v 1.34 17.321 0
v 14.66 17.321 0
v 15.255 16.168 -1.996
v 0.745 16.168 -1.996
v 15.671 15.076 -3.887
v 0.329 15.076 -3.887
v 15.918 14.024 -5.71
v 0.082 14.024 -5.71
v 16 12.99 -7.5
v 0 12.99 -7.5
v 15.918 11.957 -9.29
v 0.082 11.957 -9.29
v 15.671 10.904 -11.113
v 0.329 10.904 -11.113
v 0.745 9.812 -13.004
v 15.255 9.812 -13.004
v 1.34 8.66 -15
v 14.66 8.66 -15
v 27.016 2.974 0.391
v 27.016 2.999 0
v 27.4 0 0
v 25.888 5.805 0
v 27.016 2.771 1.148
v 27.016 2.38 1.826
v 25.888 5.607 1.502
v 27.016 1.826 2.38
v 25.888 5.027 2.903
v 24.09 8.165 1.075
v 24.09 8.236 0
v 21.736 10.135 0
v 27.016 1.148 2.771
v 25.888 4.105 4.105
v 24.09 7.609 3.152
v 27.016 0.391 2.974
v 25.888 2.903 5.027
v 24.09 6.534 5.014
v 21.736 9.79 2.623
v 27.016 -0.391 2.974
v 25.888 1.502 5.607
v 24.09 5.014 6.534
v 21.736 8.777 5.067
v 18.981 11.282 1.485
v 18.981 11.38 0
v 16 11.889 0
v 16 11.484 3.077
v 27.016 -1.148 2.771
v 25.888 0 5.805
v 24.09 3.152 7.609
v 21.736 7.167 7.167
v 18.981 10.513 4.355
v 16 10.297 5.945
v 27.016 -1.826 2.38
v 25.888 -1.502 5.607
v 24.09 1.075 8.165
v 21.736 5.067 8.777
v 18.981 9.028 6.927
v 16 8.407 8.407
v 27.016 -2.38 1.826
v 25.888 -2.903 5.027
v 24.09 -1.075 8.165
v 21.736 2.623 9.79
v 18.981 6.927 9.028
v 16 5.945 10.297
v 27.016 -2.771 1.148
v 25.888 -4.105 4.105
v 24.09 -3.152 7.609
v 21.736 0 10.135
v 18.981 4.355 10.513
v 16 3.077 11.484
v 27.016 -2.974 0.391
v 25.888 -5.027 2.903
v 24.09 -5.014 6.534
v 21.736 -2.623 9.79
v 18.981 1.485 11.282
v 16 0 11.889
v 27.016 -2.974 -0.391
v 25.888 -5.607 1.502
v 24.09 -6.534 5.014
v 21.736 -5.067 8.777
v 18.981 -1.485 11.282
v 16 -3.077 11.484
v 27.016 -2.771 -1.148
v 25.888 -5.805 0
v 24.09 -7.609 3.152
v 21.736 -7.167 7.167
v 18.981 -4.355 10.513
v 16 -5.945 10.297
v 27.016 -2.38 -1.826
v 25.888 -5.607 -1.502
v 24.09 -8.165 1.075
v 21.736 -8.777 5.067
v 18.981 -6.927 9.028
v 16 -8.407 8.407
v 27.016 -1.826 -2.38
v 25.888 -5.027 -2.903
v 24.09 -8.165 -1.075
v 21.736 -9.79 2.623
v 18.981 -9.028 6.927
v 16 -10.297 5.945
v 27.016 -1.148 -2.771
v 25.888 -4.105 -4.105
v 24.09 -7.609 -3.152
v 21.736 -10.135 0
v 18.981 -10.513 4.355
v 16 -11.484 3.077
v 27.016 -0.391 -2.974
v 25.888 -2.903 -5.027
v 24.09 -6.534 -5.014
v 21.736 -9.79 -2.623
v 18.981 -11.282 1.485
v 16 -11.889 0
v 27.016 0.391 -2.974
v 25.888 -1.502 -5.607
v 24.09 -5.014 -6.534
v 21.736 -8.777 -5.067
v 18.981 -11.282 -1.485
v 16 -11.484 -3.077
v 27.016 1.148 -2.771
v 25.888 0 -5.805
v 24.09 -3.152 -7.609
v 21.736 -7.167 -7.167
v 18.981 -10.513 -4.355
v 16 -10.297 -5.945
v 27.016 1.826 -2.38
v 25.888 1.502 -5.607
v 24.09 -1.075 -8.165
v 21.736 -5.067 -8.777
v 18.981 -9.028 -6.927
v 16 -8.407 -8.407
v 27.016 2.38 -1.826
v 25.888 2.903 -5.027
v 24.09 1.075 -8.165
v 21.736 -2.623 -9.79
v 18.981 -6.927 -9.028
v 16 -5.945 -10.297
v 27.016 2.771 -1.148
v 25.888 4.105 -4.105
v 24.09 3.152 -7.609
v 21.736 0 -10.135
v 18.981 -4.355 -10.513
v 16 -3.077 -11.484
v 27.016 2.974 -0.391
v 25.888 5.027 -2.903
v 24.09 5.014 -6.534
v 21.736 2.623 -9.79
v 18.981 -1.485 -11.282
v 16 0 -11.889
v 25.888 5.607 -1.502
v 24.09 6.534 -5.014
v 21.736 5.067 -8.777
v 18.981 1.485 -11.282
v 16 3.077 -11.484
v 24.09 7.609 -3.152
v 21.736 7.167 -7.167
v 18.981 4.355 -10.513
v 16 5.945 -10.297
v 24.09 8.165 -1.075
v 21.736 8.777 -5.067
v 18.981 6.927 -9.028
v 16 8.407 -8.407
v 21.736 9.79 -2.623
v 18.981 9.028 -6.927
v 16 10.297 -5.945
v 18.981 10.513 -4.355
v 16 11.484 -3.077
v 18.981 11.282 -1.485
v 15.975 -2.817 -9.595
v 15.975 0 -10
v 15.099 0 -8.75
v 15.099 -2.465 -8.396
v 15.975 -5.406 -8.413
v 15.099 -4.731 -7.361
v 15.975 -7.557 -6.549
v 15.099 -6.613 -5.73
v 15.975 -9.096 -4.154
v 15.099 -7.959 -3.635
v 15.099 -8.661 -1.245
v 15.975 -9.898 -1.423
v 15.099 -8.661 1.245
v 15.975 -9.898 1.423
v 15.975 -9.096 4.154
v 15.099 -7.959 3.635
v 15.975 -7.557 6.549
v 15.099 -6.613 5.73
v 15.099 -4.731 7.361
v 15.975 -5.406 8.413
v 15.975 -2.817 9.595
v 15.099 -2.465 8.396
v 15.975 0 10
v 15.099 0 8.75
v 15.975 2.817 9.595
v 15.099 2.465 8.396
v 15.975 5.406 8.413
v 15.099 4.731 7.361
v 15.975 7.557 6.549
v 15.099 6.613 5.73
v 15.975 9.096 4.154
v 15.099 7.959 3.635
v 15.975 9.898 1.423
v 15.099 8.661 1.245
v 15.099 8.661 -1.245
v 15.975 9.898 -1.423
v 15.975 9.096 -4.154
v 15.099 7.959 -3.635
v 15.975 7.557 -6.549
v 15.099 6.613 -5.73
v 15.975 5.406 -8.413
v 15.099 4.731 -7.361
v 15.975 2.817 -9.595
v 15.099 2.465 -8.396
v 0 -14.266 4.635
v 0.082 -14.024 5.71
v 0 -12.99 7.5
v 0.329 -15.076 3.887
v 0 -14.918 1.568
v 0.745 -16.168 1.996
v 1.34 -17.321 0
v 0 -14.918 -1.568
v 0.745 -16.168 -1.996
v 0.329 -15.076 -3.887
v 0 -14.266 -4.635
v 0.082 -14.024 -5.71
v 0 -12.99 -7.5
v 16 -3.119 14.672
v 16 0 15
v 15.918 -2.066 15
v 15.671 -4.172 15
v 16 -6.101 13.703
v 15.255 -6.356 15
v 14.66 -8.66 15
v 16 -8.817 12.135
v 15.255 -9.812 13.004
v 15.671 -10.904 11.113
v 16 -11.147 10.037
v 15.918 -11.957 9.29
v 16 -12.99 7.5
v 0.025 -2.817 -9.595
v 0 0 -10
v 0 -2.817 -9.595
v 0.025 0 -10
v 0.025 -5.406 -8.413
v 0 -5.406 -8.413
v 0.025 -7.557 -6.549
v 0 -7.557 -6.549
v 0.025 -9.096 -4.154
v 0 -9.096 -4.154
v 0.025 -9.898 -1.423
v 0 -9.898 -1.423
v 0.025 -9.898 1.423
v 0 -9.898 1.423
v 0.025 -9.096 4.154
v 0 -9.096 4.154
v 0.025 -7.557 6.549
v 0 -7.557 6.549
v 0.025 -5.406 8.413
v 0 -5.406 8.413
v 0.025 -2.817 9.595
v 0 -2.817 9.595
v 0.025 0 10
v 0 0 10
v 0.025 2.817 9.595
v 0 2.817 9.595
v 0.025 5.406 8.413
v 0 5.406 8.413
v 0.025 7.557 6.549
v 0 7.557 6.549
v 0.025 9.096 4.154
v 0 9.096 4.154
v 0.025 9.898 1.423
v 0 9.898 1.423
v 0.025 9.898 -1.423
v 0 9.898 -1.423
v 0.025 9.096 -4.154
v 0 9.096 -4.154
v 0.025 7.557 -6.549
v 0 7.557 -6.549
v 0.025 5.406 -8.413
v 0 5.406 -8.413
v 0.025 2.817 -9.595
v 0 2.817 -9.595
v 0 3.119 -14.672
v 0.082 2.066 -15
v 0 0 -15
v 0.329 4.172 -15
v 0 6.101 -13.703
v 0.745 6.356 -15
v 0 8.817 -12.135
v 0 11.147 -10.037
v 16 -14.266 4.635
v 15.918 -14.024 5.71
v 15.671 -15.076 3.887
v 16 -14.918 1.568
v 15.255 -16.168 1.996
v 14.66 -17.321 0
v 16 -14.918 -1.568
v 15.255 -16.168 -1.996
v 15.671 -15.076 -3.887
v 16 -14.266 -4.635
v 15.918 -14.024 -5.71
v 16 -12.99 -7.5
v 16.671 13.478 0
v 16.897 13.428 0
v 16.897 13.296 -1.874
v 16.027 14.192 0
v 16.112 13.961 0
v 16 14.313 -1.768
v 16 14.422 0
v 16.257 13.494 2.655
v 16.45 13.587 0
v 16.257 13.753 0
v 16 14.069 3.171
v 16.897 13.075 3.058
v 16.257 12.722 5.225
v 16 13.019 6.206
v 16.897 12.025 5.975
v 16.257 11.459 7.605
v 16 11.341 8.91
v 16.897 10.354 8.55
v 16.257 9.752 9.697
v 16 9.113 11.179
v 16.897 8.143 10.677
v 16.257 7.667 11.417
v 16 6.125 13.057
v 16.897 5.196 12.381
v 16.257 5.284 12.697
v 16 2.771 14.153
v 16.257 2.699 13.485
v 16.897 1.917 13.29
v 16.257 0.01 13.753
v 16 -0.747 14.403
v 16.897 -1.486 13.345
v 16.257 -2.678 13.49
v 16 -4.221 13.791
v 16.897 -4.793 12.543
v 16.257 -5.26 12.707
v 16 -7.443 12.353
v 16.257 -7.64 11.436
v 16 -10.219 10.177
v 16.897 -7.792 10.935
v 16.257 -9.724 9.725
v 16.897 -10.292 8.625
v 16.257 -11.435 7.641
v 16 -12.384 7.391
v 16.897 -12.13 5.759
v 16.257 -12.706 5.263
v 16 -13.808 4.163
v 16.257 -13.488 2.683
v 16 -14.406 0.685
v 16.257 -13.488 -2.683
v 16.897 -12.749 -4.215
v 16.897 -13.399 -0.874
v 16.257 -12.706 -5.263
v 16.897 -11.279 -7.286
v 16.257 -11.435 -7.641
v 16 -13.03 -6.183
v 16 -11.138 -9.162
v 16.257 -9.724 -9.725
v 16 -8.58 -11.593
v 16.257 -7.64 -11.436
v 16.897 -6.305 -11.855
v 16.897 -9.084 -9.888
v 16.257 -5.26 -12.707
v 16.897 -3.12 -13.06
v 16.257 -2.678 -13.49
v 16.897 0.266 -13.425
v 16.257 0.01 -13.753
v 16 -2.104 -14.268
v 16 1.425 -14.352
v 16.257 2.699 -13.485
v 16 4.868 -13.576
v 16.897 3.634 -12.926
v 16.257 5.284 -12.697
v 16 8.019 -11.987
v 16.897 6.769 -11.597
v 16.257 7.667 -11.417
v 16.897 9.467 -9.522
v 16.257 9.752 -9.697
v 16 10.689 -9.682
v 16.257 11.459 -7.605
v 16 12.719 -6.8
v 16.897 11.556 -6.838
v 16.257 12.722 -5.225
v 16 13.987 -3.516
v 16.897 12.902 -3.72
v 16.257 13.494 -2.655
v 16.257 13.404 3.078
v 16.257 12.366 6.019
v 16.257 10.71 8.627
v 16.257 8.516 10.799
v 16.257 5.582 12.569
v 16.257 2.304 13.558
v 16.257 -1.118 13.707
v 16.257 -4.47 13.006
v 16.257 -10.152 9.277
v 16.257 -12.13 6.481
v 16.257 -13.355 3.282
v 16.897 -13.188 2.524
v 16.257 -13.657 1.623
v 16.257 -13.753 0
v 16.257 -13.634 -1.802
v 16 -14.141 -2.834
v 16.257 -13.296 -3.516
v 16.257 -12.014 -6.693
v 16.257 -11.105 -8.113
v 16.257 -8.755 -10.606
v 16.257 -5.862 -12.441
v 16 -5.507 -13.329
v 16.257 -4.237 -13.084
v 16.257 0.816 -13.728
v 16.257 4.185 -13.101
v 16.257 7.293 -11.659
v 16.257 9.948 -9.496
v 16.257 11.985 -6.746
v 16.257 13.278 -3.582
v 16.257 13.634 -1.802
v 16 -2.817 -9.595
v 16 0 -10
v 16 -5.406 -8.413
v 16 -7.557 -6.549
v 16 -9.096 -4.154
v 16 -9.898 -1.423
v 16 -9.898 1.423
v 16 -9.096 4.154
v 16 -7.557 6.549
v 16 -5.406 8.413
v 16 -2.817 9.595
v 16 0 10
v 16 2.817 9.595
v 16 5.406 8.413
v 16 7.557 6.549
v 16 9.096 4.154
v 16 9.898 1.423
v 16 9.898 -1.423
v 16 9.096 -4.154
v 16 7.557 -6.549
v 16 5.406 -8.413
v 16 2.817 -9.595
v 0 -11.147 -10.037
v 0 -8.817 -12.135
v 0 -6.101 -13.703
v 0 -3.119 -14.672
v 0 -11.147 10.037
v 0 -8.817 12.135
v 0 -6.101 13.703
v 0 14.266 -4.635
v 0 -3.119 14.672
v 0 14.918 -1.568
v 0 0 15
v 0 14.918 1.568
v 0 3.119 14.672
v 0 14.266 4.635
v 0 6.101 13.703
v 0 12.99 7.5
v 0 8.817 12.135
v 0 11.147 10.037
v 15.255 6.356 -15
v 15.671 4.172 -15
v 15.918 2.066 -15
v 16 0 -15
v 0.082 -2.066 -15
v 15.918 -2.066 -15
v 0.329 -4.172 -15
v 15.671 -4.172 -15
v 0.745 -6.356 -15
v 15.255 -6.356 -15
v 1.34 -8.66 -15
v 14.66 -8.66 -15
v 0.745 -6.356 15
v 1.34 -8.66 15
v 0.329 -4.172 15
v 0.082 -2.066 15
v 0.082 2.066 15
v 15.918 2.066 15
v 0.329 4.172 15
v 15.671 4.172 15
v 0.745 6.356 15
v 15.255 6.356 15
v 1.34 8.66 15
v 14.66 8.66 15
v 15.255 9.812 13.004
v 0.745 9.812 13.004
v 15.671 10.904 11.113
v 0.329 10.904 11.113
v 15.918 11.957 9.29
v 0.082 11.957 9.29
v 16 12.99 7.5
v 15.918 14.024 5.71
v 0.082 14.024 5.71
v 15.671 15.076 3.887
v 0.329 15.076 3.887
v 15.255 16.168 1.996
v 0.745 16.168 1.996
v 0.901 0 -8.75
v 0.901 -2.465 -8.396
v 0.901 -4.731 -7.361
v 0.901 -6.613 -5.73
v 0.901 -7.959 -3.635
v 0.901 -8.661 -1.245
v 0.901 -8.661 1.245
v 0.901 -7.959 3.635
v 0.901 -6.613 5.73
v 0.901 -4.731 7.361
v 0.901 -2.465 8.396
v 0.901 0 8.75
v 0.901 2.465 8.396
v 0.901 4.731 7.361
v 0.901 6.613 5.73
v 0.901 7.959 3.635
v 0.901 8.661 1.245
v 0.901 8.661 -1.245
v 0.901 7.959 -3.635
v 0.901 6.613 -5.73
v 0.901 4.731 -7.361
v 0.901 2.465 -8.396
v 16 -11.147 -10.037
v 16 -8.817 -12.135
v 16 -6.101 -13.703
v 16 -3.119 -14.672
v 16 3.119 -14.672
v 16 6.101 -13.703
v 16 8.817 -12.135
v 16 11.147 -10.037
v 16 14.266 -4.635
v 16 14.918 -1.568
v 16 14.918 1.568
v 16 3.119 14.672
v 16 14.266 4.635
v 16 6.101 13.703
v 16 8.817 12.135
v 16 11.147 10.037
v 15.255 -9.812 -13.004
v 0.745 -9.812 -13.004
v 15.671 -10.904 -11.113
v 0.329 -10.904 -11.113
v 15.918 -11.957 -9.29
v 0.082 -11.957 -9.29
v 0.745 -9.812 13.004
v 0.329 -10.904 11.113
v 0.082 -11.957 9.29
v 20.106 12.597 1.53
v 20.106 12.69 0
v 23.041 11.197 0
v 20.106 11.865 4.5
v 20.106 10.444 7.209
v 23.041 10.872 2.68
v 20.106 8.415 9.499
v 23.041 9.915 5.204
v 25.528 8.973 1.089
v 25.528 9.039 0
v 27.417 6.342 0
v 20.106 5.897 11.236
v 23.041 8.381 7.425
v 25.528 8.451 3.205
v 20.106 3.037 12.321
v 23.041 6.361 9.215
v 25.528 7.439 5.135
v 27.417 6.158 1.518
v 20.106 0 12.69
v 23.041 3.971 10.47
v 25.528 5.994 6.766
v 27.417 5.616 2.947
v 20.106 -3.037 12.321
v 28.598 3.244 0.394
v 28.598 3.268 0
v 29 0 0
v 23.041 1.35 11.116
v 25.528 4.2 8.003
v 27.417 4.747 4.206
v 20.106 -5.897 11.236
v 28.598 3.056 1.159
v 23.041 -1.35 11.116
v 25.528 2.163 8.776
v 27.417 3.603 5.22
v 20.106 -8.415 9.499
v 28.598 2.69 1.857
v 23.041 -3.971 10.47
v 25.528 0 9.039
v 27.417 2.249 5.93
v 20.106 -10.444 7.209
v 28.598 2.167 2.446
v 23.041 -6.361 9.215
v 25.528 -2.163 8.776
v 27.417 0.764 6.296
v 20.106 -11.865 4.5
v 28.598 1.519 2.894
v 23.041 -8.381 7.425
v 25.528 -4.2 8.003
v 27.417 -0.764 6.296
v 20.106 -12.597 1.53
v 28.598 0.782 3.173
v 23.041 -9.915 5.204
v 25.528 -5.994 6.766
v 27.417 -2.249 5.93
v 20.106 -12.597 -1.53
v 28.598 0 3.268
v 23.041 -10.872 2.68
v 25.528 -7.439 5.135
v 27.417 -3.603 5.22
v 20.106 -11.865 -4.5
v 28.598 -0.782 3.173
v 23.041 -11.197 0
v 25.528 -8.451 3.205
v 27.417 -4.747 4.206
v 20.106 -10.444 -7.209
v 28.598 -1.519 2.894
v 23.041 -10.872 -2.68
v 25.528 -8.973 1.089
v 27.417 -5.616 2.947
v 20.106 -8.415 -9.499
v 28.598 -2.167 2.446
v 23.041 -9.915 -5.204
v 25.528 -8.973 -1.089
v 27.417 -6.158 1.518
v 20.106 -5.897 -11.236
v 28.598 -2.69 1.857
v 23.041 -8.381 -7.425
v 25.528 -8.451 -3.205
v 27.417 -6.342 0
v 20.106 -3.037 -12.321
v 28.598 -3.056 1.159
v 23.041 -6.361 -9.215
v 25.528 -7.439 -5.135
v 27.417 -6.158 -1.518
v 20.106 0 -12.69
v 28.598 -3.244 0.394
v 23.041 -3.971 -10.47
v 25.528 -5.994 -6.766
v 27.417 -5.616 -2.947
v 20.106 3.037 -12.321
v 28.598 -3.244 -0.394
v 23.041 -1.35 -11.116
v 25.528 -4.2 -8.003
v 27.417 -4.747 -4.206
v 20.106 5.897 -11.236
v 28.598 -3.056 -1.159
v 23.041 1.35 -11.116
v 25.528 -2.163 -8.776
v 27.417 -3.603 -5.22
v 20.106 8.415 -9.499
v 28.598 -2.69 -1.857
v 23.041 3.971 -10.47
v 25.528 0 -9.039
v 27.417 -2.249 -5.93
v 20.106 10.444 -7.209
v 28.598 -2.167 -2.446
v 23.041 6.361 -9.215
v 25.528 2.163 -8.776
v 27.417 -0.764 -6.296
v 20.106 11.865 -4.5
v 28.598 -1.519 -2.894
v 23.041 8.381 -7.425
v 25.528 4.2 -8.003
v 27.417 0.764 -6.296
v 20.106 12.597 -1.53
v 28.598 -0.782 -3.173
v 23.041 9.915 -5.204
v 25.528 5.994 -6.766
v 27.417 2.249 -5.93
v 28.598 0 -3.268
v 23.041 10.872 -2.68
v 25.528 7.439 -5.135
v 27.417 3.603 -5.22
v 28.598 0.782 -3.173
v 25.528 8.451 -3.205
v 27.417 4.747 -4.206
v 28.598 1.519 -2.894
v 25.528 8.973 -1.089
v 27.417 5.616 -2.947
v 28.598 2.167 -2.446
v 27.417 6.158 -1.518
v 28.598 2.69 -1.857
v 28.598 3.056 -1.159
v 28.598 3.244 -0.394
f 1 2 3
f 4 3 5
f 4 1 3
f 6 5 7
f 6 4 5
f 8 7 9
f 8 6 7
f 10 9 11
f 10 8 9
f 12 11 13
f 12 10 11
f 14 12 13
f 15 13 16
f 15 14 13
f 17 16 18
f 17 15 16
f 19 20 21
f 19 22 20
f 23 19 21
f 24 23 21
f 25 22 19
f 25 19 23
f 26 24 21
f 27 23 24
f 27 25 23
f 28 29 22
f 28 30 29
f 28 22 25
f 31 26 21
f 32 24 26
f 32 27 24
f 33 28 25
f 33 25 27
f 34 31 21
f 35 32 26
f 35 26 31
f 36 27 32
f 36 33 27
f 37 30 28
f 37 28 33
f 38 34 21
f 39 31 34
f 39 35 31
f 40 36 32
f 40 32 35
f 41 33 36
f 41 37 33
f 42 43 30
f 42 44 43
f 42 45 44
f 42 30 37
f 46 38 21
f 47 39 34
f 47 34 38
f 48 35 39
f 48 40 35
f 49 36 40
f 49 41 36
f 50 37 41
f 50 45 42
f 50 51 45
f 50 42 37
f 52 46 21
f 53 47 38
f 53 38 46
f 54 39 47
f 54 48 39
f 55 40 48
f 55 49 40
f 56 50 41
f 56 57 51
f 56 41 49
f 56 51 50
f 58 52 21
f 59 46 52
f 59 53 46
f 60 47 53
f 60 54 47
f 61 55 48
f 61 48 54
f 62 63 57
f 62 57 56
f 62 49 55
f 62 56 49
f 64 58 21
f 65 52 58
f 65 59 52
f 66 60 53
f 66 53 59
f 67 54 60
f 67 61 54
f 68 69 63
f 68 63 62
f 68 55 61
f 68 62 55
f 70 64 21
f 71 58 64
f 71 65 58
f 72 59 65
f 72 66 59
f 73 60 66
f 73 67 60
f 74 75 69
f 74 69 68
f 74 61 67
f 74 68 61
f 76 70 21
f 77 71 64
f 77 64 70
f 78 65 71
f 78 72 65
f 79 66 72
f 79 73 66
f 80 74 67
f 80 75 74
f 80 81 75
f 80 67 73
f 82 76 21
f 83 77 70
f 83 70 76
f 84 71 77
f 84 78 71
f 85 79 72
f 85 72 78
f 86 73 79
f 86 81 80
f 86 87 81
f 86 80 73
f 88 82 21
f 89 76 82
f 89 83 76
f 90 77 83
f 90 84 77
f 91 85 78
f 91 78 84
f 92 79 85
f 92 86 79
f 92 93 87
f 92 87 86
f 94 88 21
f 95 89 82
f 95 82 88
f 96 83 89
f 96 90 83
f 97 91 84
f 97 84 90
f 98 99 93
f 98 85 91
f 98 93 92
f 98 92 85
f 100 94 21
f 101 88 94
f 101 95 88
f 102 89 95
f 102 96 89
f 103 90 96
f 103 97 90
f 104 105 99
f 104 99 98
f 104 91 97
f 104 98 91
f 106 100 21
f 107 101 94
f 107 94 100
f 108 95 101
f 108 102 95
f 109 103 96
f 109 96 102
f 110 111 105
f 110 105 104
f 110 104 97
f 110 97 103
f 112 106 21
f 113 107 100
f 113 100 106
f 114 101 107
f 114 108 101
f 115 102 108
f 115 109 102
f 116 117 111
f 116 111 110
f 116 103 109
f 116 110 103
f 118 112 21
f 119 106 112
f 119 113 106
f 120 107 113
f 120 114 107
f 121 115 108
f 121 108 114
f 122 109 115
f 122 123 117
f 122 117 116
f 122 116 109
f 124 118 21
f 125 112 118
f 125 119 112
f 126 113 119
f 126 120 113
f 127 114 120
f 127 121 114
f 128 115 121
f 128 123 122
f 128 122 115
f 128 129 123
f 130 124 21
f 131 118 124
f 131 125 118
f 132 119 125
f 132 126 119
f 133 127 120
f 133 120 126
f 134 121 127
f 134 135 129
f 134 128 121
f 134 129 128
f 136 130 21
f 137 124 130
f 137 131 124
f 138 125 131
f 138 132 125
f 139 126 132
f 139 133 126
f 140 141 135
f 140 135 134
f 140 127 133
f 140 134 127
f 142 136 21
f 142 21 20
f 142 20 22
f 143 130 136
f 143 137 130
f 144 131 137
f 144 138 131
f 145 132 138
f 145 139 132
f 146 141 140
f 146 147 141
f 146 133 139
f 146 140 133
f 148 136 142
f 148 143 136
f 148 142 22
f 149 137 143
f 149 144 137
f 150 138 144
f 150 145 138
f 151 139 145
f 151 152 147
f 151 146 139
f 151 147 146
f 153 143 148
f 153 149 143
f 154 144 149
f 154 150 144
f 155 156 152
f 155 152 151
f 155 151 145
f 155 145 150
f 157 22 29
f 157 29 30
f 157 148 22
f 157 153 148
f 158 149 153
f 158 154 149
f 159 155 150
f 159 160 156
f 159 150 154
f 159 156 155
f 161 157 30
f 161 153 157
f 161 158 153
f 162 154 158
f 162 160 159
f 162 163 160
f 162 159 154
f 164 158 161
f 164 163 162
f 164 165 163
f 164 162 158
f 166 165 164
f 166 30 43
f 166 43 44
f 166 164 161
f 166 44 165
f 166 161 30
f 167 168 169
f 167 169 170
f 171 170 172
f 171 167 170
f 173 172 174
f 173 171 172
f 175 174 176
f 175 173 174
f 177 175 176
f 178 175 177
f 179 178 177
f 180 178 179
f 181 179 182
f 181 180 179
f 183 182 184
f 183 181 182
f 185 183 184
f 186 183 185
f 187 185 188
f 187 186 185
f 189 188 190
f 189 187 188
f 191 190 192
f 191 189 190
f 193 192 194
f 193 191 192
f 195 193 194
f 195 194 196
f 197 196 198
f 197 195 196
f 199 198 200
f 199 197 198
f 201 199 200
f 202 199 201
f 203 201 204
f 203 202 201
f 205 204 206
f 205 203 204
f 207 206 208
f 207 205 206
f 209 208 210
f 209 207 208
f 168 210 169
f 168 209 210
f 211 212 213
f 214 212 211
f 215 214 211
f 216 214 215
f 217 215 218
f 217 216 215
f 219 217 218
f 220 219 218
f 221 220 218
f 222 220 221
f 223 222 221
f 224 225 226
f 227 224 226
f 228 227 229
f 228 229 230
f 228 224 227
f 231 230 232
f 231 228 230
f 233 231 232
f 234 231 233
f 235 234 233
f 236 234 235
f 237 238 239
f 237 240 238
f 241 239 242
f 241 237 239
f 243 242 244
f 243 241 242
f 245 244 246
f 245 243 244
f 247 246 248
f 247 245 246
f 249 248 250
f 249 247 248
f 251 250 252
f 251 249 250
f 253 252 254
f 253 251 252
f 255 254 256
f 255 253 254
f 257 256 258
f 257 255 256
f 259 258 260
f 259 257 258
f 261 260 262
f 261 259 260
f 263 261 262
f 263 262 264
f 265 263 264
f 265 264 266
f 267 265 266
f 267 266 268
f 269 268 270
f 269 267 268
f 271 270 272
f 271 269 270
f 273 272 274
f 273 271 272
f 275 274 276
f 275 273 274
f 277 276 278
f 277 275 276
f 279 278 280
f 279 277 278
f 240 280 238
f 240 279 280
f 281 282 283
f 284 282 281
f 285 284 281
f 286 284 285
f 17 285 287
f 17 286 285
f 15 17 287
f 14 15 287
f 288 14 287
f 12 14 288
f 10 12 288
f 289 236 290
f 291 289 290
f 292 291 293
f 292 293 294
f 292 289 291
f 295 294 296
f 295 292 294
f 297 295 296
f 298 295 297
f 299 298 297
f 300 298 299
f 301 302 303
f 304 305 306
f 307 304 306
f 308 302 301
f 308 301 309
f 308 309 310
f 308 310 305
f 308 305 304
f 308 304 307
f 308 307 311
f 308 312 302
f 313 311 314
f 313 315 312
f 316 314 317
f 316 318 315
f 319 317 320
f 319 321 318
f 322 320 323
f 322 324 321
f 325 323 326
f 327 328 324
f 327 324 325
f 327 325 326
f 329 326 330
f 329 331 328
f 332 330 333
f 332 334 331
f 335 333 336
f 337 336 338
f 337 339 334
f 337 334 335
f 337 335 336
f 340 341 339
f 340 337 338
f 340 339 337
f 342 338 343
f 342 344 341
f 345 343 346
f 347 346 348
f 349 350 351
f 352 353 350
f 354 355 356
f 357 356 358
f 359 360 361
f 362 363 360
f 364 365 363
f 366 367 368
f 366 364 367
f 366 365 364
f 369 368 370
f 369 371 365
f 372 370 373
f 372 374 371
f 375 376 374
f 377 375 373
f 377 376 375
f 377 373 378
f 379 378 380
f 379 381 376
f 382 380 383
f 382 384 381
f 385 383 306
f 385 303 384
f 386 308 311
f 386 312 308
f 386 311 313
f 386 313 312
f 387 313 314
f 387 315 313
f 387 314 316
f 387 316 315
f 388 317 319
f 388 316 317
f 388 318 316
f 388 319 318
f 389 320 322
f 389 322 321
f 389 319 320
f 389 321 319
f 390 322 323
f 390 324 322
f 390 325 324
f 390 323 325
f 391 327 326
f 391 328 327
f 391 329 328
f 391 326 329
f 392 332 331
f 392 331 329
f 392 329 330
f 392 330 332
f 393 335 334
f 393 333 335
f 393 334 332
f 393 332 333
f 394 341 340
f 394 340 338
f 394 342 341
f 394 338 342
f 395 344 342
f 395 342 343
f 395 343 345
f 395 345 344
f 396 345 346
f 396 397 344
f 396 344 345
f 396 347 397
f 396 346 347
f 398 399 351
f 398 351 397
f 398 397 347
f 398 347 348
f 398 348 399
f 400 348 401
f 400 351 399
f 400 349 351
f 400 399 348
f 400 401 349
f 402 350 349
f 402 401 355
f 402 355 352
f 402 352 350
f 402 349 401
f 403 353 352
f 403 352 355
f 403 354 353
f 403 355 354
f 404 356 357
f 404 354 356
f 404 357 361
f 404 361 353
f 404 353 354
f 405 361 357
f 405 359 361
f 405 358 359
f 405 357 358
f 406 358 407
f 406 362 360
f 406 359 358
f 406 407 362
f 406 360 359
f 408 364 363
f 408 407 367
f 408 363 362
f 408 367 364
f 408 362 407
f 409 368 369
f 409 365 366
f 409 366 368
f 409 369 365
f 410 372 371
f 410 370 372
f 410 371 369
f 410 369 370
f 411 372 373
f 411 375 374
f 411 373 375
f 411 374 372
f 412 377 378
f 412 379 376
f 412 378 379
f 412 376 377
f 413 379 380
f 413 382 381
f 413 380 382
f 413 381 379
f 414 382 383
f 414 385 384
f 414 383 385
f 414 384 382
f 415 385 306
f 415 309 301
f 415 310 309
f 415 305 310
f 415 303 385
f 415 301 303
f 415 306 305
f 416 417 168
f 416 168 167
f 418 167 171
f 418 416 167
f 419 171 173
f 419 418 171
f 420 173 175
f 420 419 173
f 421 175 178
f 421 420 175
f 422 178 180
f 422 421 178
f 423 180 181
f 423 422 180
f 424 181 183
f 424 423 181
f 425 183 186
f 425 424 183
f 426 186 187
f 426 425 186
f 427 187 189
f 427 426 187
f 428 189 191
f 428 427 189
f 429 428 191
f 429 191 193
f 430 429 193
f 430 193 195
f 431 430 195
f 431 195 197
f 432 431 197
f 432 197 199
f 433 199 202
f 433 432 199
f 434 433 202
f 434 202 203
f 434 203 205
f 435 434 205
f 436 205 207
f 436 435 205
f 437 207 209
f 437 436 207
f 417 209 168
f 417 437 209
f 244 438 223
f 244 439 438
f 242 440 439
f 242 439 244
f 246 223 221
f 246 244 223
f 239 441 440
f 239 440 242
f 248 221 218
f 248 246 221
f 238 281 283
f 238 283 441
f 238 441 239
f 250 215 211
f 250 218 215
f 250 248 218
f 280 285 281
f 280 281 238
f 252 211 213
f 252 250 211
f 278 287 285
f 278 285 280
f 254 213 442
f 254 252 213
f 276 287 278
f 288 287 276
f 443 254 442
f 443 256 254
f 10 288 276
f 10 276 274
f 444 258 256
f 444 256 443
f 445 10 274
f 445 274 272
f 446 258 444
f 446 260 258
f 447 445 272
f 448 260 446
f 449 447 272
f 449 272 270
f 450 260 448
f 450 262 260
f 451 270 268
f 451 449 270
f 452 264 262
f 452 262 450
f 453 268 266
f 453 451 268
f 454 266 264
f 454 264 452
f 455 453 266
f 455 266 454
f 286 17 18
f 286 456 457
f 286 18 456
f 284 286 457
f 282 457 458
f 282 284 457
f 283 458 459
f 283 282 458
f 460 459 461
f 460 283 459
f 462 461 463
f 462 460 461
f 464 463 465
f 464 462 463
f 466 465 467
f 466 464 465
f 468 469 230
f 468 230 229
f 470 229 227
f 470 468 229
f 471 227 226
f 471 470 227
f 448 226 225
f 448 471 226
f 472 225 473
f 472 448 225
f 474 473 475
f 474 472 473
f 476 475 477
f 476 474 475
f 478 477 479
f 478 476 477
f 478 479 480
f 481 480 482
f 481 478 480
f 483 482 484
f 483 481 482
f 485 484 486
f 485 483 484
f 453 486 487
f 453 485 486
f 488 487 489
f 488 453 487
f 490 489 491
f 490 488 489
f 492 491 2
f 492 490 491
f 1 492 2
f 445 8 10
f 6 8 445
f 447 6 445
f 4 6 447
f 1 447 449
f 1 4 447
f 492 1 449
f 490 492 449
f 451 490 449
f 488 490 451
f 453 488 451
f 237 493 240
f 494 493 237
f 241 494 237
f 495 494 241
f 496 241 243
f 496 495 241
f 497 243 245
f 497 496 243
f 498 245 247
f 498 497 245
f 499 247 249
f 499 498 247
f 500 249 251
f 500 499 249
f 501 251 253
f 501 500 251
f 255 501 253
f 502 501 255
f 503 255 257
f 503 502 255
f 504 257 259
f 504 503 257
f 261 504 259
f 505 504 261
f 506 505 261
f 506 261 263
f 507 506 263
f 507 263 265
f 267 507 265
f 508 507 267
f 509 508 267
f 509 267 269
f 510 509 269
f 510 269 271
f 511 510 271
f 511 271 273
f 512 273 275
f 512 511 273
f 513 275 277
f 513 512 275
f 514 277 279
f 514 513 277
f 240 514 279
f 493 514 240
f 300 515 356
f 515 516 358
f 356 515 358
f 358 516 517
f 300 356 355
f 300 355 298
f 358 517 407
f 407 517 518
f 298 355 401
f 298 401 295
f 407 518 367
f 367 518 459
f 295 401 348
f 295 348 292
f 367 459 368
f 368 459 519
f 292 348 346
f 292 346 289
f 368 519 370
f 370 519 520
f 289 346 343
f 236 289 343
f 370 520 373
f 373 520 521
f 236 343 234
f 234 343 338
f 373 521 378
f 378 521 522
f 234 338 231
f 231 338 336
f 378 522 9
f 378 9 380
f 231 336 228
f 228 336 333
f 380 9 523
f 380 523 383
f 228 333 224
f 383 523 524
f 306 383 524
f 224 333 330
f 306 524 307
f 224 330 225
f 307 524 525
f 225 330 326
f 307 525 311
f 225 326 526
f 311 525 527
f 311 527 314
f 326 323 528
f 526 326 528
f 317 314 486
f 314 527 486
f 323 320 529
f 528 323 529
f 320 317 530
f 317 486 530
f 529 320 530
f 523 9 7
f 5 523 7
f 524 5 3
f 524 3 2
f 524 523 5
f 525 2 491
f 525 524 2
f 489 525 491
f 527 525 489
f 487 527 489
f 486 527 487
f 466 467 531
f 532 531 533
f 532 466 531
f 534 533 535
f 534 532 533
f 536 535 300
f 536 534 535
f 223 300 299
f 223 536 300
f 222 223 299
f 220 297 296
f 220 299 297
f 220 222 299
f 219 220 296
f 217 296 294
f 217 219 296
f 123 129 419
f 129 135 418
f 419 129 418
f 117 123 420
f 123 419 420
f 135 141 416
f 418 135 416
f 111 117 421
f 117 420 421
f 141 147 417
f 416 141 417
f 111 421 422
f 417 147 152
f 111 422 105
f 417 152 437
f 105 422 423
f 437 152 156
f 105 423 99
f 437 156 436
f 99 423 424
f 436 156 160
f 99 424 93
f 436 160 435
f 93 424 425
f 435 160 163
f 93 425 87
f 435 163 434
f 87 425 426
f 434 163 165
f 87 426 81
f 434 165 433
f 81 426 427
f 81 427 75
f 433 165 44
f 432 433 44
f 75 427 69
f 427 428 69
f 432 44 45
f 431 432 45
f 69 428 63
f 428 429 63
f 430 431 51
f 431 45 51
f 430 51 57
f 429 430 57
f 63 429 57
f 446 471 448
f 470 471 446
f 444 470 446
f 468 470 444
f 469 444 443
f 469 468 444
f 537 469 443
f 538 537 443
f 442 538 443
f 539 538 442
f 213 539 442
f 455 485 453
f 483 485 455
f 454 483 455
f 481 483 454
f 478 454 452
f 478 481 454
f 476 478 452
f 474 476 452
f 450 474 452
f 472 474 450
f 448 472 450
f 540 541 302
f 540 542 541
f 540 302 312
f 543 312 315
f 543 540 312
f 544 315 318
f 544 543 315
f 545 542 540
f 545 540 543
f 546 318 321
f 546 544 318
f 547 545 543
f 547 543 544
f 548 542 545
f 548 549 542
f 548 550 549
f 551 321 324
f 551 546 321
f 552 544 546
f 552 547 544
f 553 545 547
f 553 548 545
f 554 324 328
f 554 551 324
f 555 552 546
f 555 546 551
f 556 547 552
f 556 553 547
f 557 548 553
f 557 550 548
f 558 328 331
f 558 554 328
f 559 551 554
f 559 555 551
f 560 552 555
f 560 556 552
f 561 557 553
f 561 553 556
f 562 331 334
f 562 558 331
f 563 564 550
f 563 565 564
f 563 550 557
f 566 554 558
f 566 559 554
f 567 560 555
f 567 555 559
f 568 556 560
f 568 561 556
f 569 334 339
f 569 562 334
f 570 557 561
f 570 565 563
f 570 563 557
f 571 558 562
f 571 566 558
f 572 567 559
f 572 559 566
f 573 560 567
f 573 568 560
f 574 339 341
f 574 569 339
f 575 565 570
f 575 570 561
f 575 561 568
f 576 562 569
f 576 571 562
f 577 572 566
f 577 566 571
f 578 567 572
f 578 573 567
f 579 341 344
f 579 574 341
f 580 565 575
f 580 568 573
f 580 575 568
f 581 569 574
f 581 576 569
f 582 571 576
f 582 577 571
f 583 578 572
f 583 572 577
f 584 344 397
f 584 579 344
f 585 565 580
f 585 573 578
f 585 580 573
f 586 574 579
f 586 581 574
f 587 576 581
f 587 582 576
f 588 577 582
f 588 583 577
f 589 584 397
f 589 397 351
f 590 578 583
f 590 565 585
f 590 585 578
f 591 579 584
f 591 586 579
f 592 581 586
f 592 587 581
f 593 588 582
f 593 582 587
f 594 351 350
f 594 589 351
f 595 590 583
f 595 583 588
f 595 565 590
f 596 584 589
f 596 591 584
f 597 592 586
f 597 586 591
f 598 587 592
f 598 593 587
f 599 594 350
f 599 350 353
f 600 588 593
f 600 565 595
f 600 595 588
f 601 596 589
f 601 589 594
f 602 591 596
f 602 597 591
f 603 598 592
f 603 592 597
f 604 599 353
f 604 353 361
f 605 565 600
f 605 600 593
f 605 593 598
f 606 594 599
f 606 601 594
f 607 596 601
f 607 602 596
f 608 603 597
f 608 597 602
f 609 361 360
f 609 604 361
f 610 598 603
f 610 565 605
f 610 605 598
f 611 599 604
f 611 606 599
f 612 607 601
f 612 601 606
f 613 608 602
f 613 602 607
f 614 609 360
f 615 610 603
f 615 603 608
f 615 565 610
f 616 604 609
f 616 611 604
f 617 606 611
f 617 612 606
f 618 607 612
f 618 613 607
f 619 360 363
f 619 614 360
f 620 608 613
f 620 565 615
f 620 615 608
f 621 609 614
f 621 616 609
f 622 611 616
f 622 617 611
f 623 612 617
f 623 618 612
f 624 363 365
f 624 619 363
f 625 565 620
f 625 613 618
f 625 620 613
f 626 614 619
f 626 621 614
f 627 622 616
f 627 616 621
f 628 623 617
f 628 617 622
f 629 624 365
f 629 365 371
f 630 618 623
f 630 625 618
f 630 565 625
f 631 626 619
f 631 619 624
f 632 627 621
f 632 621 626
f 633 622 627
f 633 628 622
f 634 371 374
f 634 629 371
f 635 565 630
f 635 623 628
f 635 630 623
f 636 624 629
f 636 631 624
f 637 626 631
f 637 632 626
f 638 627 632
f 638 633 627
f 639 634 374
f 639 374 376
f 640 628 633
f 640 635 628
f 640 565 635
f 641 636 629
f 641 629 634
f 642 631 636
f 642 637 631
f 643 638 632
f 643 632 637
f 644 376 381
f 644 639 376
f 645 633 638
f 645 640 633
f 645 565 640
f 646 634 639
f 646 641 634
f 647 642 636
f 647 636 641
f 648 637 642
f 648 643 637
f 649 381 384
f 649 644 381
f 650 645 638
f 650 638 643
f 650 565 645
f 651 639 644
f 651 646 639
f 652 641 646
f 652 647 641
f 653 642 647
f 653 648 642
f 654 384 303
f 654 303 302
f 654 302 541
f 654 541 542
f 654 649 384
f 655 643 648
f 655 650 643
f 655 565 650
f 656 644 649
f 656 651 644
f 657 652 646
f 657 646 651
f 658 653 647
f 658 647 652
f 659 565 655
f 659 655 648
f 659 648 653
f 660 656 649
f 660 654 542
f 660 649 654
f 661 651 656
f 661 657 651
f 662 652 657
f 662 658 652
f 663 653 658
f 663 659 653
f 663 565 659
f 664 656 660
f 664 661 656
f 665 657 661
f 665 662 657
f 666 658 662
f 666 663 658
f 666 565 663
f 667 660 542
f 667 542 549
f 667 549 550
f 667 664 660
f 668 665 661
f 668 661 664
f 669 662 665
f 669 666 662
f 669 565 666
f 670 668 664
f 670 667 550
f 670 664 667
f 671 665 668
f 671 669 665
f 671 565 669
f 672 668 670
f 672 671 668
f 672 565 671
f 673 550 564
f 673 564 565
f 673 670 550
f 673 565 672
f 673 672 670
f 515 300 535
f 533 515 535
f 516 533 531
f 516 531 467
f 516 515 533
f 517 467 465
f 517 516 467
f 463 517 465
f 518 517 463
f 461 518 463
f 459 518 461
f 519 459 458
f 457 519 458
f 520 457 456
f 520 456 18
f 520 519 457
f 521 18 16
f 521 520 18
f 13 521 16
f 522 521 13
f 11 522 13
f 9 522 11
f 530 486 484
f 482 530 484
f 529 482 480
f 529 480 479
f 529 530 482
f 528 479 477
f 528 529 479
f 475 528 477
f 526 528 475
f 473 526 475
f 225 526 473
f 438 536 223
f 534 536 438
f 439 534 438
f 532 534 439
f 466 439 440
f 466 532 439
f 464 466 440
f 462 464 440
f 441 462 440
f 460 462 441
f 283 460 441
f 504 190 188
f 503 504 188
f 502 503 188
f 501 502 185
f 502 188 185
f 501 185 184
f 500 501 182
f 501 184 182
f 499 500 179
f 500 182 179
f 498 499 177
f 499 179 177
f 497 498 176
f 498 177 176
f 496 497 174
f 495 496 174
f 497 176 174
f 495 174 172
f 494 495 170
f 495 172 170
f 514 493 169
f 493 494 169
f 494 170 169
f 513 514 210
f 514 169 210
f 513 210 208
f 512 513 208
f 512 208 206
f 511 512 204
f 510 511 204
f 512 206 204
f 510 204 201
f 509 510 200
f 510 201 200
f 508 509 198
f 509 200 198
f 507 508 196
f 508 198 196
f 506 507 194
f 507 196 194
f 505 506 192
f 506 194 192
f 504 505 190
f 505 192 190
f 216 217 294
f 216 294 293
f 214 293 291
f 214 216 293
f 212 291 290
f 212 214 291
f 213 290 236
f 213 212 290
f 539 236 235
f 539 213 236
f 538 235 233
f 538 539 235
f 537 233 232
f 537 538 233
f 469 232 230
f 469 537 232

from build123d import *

# Parameters (mm, degrees)
BASENUT_DEPTH = 16
DOMEFILLET_R  = 1


with BuildPart() as part:
    # BaseNutSke → BaseNut (new body)
    with BuildSketch(Plane(origin=(0, 0, 0), x_dir=(0, 0, -1), z_dir=(1, 0, 0))):
        Polygon((15, 8.660254038), (15, -8.660254038), (0, -17.320508076), (-15, -8.660254038), (-15, 8.660254038), (0, 17.320508076), align=None)
    extrude(amount=BASENUT_DEPTH)

    # DomeSke → Dome (revolve)
    with BuildSketch(Plane.XY):
        with BuildLine():
            Line((29, 0), (27.4, 0))
            ThreePointArc((27.4, 0), (23.914570696, 8.414570696), (15.5, 11.9))
            Line((15.5, 11.9), (0, 11.9))
            Line((0, 11.9), (0, 13.5))
            Line((0, 13.5), (15.5, 13.5))
            ThreePointArc((15.5, 13.5), (25.045941546, 9.545941546), (29, 0))
        make_face()
    revolve(axis=Axis((0, 0, 0), (1, 0, 0)))

    # Sketch4 → DoubleChamfer (revolve, cut)
    with BuildSketch(Plane.XY):
        Polygon((0, 15), (2.783121635, 19.820508076), (13.216878365, 19.820508076), (16, 15), (18, 15), (18, 30), (-2, 30), (-2, 15), align=None)
    revolve(axis=Axis((0, 0, 0), (1, 0, 0)), mode=Mode.SUBTRACT)

    # TapDriSke → TapDrill (revolve, cut)
    with BuildSketch(Plane.XY, mode=Mode.PRIVATE) as tapdrill_sk:
        Polygon((0, 8.75), (21.4, 8.75), (26.657530416, 0), (0, 0), align=None)
    revolve(tapdrill_sk.sketch.rotate(Axis((0, 0, 0), (1, 0, 0)), 90), axis=Axis((0, 0, 0), (1, 0, 0)), mode=Mode.SUBTRACT)

    # EndChamferSketch → EndChamfer (revolve, cut)
    with BuildSketch(Plane.XY, mode=Mode.PRIVATE) as endchamfer_sk:
        Polygon((-0.0746, 10), (0.0254, 10), (0.988185365, 8.625), (-0.0746, 8.625), align=None)
        Polygon((15.9746, 10), (16.1, 10), (16.1, 8.625), (15.011814635, 8.625), align=None)
    revolve(endchamfer_sk.sketch.rotate(Axis((0, 0, 0), (-1, 0, 0)), 90), axis=Axis((0, 0, 0), (-1, 0, 0)), mode=Mode.SUBTRACT)

    # DomeFillet
    domefillet_edges = [part.edges().sort_by_distance(p)[0] for p in [
        (16, -13.490737563, 0),
    ]]
    fillet(domefillet_edges, radius=DOMEFILLET_R)


solid = part.part
